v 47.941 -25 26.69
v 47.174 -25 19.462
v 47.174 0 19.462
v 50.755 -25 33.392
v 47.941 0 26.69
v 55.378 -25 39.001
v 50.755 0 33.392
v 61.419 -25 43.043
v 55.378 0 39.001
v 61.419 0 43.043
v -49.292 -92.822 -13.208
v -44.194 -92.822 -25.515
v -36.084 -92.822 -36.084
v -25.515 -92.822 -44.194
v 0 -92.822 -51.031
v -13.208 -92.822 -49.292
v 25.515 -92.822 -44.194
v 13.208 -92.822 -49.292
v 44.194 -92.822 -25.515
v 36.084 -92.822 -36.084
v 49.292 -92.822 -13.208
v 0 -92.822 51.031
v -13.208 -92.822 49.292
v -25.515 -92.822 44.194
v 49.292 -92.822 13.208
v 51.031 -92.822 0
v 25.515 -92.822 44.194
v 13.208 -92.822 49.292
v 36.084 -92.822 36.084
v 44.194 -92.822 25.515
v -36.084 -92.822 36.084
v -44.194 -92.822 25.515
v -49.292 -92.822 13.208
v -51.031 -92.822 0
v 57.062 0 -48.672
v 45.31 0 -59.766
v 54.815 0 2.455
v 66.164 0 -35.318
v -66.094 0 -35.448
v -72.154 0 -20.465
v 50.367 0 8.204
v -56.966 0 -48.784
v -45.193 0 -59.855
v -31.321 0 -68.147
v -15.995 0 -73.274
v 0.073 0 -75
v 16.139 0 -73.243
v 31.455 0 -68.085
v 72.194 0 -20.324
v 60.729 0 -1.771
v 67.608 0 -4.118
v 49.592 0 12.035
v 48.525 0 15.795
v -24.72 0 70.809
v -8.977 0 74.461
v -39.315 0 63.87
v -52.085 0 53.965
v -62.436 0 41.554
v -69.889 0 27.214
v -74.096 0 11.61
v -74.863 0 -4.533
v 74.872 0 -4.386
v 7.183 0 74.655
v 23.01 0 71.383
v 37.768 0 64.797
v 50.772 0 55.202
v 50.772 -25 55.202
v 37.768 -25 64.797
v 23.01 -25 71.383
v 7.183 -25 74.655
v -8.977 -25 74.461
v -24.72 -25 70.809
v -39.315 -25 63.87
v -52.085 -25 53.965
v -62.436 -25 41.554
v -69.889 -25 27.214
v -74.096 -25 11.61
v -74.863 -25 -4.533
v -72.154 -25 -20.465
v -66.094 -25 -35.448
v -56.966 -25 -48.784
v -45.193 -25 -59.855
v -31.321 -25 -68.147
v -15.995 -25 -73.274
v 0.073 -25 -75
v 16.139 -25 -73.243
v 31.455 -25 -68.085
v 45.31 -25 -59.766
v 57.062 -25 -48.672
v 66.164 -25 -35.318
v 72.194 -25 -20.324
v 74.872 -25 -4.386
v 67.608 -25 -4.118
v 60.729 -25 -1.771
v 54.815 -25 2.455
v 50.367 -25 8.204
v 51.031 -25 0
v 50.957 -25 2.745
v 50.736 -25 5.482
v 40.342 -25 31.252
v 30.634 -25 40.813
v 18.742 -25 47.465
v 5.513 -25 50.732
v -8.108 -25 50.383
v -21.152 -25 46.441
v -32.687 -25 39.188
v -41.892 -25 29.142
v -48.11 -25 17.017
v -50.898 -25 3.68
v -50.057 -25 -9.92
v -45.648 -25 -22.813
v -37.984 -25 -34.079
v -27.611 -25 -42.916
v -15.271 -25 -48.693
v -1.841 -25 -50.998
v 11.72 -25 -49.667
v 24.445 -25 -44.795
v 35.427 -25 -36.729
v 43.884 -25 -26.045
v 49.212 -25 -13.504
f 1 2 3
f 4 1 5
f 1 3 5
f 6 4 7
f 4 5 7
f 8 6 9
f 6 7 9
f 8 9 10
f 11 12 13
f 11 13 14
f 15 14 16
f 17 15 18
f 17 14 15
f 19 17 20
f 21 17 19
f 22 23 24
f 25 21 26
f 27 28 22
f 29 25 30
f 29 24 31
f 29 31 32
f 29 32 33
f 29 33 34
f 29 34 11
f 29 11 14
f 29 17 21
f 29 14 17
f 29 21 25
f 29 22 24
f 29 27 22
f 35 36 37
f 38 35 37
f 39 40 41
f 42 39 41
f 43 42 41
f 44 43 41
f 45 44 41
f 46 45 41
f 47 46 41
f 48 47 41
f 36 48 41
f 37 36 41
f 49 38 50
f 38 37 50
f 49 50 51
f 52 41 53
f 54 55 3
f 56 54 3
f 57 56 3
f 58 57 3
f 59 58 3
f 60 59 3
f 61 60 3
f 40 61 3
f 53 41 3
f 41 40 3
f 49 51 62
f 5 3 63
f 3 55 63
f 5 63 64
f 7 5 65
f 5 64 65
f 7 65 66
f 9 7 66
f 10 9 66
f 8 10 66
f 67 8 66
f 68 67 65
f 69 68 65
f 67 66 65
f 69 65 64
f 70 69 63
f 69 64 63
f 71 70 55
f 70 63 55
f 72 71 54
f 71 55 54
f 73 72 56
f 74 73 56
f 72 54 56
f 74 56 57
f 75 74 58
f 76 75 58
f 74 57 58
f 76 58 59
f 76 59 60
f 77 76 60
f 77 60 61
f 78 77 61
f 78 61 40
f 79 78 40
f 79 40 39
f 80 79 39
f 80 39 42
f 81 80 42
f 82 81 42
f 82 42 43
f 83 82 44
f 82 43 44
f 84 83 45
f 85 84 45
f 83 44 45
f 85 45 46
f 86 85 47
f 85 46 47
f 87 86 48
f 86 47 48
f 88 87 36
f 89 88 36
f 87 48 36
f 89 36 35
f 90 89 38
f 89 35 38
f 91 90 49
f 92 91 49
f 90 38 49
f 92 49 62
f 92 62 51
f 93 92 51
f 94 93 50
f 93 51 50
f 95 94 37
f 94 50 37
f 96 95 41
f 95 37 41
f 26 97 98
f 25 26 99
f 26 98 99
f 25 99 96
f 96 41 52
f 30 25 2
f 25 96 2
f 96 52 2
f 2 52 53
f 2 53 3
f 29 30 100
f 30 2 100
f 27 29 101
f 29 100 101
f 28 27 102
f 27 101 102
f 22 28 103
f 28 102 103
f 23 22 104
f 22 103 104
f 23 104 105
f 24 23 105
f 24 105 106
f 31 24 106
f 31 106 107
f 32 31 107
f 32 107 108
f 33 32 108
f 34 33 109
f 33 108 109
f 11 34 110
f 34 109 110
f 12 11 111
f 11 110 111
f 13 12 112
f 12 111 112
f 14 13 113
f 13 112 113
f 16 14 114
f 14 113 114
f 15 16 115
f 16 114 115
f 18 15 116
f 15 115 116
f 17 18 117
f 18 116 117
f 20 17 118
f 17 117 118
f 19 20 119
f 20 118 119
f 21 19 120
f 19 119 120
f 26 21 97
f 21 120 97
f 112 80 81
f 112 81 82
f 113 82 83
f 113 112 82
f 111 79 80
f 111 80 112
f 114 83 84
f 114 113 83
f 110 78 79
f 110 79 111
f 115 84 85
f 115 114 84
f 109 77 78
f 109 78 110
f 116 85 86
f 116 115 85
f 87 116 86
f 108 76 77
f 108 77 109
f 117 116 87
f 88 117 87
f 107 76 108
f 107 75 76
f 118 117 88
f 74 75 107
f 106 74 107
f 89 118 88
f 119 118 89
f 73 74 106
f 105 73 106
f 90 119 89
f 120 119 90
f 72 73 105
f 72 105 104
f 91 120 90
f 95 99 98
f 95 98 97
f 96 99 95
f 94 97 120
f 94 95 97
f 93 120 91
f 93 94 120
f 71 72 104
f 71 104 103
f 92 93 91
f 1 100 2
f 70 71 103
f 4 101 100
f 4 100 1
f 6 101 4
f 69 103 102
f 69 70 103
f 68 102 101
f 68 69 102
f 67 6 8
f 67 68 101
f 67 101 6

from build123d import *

# Parameters (mm, degrees)
F2_DEPTH = 25
F0_R     = 51.030989
F3_DEPTH = 92.821598


with BuildPart() as f2:
    # F1 (on Front) → F2 (new body)
    with BuildSketch(Plane.XZ):
        with BuildLine():
            ThreePointArc((74.871618, -4.386429), (48.102518, 13.643599), (61.418848, 43.043293))
            ThreePointArc((61.418848, 43.043293), (-72.153777, -20.465398), (74.871618, -4.386429))
        make_face()
    extrude(amount=F2_DEPTH)

    # F0 (on Front) → F3 (join)
    with BuildSketch(Plane.XZ):
        Circle(F0_R)
    extrude(amount=F3_DEPTH)


solid = f2.part
